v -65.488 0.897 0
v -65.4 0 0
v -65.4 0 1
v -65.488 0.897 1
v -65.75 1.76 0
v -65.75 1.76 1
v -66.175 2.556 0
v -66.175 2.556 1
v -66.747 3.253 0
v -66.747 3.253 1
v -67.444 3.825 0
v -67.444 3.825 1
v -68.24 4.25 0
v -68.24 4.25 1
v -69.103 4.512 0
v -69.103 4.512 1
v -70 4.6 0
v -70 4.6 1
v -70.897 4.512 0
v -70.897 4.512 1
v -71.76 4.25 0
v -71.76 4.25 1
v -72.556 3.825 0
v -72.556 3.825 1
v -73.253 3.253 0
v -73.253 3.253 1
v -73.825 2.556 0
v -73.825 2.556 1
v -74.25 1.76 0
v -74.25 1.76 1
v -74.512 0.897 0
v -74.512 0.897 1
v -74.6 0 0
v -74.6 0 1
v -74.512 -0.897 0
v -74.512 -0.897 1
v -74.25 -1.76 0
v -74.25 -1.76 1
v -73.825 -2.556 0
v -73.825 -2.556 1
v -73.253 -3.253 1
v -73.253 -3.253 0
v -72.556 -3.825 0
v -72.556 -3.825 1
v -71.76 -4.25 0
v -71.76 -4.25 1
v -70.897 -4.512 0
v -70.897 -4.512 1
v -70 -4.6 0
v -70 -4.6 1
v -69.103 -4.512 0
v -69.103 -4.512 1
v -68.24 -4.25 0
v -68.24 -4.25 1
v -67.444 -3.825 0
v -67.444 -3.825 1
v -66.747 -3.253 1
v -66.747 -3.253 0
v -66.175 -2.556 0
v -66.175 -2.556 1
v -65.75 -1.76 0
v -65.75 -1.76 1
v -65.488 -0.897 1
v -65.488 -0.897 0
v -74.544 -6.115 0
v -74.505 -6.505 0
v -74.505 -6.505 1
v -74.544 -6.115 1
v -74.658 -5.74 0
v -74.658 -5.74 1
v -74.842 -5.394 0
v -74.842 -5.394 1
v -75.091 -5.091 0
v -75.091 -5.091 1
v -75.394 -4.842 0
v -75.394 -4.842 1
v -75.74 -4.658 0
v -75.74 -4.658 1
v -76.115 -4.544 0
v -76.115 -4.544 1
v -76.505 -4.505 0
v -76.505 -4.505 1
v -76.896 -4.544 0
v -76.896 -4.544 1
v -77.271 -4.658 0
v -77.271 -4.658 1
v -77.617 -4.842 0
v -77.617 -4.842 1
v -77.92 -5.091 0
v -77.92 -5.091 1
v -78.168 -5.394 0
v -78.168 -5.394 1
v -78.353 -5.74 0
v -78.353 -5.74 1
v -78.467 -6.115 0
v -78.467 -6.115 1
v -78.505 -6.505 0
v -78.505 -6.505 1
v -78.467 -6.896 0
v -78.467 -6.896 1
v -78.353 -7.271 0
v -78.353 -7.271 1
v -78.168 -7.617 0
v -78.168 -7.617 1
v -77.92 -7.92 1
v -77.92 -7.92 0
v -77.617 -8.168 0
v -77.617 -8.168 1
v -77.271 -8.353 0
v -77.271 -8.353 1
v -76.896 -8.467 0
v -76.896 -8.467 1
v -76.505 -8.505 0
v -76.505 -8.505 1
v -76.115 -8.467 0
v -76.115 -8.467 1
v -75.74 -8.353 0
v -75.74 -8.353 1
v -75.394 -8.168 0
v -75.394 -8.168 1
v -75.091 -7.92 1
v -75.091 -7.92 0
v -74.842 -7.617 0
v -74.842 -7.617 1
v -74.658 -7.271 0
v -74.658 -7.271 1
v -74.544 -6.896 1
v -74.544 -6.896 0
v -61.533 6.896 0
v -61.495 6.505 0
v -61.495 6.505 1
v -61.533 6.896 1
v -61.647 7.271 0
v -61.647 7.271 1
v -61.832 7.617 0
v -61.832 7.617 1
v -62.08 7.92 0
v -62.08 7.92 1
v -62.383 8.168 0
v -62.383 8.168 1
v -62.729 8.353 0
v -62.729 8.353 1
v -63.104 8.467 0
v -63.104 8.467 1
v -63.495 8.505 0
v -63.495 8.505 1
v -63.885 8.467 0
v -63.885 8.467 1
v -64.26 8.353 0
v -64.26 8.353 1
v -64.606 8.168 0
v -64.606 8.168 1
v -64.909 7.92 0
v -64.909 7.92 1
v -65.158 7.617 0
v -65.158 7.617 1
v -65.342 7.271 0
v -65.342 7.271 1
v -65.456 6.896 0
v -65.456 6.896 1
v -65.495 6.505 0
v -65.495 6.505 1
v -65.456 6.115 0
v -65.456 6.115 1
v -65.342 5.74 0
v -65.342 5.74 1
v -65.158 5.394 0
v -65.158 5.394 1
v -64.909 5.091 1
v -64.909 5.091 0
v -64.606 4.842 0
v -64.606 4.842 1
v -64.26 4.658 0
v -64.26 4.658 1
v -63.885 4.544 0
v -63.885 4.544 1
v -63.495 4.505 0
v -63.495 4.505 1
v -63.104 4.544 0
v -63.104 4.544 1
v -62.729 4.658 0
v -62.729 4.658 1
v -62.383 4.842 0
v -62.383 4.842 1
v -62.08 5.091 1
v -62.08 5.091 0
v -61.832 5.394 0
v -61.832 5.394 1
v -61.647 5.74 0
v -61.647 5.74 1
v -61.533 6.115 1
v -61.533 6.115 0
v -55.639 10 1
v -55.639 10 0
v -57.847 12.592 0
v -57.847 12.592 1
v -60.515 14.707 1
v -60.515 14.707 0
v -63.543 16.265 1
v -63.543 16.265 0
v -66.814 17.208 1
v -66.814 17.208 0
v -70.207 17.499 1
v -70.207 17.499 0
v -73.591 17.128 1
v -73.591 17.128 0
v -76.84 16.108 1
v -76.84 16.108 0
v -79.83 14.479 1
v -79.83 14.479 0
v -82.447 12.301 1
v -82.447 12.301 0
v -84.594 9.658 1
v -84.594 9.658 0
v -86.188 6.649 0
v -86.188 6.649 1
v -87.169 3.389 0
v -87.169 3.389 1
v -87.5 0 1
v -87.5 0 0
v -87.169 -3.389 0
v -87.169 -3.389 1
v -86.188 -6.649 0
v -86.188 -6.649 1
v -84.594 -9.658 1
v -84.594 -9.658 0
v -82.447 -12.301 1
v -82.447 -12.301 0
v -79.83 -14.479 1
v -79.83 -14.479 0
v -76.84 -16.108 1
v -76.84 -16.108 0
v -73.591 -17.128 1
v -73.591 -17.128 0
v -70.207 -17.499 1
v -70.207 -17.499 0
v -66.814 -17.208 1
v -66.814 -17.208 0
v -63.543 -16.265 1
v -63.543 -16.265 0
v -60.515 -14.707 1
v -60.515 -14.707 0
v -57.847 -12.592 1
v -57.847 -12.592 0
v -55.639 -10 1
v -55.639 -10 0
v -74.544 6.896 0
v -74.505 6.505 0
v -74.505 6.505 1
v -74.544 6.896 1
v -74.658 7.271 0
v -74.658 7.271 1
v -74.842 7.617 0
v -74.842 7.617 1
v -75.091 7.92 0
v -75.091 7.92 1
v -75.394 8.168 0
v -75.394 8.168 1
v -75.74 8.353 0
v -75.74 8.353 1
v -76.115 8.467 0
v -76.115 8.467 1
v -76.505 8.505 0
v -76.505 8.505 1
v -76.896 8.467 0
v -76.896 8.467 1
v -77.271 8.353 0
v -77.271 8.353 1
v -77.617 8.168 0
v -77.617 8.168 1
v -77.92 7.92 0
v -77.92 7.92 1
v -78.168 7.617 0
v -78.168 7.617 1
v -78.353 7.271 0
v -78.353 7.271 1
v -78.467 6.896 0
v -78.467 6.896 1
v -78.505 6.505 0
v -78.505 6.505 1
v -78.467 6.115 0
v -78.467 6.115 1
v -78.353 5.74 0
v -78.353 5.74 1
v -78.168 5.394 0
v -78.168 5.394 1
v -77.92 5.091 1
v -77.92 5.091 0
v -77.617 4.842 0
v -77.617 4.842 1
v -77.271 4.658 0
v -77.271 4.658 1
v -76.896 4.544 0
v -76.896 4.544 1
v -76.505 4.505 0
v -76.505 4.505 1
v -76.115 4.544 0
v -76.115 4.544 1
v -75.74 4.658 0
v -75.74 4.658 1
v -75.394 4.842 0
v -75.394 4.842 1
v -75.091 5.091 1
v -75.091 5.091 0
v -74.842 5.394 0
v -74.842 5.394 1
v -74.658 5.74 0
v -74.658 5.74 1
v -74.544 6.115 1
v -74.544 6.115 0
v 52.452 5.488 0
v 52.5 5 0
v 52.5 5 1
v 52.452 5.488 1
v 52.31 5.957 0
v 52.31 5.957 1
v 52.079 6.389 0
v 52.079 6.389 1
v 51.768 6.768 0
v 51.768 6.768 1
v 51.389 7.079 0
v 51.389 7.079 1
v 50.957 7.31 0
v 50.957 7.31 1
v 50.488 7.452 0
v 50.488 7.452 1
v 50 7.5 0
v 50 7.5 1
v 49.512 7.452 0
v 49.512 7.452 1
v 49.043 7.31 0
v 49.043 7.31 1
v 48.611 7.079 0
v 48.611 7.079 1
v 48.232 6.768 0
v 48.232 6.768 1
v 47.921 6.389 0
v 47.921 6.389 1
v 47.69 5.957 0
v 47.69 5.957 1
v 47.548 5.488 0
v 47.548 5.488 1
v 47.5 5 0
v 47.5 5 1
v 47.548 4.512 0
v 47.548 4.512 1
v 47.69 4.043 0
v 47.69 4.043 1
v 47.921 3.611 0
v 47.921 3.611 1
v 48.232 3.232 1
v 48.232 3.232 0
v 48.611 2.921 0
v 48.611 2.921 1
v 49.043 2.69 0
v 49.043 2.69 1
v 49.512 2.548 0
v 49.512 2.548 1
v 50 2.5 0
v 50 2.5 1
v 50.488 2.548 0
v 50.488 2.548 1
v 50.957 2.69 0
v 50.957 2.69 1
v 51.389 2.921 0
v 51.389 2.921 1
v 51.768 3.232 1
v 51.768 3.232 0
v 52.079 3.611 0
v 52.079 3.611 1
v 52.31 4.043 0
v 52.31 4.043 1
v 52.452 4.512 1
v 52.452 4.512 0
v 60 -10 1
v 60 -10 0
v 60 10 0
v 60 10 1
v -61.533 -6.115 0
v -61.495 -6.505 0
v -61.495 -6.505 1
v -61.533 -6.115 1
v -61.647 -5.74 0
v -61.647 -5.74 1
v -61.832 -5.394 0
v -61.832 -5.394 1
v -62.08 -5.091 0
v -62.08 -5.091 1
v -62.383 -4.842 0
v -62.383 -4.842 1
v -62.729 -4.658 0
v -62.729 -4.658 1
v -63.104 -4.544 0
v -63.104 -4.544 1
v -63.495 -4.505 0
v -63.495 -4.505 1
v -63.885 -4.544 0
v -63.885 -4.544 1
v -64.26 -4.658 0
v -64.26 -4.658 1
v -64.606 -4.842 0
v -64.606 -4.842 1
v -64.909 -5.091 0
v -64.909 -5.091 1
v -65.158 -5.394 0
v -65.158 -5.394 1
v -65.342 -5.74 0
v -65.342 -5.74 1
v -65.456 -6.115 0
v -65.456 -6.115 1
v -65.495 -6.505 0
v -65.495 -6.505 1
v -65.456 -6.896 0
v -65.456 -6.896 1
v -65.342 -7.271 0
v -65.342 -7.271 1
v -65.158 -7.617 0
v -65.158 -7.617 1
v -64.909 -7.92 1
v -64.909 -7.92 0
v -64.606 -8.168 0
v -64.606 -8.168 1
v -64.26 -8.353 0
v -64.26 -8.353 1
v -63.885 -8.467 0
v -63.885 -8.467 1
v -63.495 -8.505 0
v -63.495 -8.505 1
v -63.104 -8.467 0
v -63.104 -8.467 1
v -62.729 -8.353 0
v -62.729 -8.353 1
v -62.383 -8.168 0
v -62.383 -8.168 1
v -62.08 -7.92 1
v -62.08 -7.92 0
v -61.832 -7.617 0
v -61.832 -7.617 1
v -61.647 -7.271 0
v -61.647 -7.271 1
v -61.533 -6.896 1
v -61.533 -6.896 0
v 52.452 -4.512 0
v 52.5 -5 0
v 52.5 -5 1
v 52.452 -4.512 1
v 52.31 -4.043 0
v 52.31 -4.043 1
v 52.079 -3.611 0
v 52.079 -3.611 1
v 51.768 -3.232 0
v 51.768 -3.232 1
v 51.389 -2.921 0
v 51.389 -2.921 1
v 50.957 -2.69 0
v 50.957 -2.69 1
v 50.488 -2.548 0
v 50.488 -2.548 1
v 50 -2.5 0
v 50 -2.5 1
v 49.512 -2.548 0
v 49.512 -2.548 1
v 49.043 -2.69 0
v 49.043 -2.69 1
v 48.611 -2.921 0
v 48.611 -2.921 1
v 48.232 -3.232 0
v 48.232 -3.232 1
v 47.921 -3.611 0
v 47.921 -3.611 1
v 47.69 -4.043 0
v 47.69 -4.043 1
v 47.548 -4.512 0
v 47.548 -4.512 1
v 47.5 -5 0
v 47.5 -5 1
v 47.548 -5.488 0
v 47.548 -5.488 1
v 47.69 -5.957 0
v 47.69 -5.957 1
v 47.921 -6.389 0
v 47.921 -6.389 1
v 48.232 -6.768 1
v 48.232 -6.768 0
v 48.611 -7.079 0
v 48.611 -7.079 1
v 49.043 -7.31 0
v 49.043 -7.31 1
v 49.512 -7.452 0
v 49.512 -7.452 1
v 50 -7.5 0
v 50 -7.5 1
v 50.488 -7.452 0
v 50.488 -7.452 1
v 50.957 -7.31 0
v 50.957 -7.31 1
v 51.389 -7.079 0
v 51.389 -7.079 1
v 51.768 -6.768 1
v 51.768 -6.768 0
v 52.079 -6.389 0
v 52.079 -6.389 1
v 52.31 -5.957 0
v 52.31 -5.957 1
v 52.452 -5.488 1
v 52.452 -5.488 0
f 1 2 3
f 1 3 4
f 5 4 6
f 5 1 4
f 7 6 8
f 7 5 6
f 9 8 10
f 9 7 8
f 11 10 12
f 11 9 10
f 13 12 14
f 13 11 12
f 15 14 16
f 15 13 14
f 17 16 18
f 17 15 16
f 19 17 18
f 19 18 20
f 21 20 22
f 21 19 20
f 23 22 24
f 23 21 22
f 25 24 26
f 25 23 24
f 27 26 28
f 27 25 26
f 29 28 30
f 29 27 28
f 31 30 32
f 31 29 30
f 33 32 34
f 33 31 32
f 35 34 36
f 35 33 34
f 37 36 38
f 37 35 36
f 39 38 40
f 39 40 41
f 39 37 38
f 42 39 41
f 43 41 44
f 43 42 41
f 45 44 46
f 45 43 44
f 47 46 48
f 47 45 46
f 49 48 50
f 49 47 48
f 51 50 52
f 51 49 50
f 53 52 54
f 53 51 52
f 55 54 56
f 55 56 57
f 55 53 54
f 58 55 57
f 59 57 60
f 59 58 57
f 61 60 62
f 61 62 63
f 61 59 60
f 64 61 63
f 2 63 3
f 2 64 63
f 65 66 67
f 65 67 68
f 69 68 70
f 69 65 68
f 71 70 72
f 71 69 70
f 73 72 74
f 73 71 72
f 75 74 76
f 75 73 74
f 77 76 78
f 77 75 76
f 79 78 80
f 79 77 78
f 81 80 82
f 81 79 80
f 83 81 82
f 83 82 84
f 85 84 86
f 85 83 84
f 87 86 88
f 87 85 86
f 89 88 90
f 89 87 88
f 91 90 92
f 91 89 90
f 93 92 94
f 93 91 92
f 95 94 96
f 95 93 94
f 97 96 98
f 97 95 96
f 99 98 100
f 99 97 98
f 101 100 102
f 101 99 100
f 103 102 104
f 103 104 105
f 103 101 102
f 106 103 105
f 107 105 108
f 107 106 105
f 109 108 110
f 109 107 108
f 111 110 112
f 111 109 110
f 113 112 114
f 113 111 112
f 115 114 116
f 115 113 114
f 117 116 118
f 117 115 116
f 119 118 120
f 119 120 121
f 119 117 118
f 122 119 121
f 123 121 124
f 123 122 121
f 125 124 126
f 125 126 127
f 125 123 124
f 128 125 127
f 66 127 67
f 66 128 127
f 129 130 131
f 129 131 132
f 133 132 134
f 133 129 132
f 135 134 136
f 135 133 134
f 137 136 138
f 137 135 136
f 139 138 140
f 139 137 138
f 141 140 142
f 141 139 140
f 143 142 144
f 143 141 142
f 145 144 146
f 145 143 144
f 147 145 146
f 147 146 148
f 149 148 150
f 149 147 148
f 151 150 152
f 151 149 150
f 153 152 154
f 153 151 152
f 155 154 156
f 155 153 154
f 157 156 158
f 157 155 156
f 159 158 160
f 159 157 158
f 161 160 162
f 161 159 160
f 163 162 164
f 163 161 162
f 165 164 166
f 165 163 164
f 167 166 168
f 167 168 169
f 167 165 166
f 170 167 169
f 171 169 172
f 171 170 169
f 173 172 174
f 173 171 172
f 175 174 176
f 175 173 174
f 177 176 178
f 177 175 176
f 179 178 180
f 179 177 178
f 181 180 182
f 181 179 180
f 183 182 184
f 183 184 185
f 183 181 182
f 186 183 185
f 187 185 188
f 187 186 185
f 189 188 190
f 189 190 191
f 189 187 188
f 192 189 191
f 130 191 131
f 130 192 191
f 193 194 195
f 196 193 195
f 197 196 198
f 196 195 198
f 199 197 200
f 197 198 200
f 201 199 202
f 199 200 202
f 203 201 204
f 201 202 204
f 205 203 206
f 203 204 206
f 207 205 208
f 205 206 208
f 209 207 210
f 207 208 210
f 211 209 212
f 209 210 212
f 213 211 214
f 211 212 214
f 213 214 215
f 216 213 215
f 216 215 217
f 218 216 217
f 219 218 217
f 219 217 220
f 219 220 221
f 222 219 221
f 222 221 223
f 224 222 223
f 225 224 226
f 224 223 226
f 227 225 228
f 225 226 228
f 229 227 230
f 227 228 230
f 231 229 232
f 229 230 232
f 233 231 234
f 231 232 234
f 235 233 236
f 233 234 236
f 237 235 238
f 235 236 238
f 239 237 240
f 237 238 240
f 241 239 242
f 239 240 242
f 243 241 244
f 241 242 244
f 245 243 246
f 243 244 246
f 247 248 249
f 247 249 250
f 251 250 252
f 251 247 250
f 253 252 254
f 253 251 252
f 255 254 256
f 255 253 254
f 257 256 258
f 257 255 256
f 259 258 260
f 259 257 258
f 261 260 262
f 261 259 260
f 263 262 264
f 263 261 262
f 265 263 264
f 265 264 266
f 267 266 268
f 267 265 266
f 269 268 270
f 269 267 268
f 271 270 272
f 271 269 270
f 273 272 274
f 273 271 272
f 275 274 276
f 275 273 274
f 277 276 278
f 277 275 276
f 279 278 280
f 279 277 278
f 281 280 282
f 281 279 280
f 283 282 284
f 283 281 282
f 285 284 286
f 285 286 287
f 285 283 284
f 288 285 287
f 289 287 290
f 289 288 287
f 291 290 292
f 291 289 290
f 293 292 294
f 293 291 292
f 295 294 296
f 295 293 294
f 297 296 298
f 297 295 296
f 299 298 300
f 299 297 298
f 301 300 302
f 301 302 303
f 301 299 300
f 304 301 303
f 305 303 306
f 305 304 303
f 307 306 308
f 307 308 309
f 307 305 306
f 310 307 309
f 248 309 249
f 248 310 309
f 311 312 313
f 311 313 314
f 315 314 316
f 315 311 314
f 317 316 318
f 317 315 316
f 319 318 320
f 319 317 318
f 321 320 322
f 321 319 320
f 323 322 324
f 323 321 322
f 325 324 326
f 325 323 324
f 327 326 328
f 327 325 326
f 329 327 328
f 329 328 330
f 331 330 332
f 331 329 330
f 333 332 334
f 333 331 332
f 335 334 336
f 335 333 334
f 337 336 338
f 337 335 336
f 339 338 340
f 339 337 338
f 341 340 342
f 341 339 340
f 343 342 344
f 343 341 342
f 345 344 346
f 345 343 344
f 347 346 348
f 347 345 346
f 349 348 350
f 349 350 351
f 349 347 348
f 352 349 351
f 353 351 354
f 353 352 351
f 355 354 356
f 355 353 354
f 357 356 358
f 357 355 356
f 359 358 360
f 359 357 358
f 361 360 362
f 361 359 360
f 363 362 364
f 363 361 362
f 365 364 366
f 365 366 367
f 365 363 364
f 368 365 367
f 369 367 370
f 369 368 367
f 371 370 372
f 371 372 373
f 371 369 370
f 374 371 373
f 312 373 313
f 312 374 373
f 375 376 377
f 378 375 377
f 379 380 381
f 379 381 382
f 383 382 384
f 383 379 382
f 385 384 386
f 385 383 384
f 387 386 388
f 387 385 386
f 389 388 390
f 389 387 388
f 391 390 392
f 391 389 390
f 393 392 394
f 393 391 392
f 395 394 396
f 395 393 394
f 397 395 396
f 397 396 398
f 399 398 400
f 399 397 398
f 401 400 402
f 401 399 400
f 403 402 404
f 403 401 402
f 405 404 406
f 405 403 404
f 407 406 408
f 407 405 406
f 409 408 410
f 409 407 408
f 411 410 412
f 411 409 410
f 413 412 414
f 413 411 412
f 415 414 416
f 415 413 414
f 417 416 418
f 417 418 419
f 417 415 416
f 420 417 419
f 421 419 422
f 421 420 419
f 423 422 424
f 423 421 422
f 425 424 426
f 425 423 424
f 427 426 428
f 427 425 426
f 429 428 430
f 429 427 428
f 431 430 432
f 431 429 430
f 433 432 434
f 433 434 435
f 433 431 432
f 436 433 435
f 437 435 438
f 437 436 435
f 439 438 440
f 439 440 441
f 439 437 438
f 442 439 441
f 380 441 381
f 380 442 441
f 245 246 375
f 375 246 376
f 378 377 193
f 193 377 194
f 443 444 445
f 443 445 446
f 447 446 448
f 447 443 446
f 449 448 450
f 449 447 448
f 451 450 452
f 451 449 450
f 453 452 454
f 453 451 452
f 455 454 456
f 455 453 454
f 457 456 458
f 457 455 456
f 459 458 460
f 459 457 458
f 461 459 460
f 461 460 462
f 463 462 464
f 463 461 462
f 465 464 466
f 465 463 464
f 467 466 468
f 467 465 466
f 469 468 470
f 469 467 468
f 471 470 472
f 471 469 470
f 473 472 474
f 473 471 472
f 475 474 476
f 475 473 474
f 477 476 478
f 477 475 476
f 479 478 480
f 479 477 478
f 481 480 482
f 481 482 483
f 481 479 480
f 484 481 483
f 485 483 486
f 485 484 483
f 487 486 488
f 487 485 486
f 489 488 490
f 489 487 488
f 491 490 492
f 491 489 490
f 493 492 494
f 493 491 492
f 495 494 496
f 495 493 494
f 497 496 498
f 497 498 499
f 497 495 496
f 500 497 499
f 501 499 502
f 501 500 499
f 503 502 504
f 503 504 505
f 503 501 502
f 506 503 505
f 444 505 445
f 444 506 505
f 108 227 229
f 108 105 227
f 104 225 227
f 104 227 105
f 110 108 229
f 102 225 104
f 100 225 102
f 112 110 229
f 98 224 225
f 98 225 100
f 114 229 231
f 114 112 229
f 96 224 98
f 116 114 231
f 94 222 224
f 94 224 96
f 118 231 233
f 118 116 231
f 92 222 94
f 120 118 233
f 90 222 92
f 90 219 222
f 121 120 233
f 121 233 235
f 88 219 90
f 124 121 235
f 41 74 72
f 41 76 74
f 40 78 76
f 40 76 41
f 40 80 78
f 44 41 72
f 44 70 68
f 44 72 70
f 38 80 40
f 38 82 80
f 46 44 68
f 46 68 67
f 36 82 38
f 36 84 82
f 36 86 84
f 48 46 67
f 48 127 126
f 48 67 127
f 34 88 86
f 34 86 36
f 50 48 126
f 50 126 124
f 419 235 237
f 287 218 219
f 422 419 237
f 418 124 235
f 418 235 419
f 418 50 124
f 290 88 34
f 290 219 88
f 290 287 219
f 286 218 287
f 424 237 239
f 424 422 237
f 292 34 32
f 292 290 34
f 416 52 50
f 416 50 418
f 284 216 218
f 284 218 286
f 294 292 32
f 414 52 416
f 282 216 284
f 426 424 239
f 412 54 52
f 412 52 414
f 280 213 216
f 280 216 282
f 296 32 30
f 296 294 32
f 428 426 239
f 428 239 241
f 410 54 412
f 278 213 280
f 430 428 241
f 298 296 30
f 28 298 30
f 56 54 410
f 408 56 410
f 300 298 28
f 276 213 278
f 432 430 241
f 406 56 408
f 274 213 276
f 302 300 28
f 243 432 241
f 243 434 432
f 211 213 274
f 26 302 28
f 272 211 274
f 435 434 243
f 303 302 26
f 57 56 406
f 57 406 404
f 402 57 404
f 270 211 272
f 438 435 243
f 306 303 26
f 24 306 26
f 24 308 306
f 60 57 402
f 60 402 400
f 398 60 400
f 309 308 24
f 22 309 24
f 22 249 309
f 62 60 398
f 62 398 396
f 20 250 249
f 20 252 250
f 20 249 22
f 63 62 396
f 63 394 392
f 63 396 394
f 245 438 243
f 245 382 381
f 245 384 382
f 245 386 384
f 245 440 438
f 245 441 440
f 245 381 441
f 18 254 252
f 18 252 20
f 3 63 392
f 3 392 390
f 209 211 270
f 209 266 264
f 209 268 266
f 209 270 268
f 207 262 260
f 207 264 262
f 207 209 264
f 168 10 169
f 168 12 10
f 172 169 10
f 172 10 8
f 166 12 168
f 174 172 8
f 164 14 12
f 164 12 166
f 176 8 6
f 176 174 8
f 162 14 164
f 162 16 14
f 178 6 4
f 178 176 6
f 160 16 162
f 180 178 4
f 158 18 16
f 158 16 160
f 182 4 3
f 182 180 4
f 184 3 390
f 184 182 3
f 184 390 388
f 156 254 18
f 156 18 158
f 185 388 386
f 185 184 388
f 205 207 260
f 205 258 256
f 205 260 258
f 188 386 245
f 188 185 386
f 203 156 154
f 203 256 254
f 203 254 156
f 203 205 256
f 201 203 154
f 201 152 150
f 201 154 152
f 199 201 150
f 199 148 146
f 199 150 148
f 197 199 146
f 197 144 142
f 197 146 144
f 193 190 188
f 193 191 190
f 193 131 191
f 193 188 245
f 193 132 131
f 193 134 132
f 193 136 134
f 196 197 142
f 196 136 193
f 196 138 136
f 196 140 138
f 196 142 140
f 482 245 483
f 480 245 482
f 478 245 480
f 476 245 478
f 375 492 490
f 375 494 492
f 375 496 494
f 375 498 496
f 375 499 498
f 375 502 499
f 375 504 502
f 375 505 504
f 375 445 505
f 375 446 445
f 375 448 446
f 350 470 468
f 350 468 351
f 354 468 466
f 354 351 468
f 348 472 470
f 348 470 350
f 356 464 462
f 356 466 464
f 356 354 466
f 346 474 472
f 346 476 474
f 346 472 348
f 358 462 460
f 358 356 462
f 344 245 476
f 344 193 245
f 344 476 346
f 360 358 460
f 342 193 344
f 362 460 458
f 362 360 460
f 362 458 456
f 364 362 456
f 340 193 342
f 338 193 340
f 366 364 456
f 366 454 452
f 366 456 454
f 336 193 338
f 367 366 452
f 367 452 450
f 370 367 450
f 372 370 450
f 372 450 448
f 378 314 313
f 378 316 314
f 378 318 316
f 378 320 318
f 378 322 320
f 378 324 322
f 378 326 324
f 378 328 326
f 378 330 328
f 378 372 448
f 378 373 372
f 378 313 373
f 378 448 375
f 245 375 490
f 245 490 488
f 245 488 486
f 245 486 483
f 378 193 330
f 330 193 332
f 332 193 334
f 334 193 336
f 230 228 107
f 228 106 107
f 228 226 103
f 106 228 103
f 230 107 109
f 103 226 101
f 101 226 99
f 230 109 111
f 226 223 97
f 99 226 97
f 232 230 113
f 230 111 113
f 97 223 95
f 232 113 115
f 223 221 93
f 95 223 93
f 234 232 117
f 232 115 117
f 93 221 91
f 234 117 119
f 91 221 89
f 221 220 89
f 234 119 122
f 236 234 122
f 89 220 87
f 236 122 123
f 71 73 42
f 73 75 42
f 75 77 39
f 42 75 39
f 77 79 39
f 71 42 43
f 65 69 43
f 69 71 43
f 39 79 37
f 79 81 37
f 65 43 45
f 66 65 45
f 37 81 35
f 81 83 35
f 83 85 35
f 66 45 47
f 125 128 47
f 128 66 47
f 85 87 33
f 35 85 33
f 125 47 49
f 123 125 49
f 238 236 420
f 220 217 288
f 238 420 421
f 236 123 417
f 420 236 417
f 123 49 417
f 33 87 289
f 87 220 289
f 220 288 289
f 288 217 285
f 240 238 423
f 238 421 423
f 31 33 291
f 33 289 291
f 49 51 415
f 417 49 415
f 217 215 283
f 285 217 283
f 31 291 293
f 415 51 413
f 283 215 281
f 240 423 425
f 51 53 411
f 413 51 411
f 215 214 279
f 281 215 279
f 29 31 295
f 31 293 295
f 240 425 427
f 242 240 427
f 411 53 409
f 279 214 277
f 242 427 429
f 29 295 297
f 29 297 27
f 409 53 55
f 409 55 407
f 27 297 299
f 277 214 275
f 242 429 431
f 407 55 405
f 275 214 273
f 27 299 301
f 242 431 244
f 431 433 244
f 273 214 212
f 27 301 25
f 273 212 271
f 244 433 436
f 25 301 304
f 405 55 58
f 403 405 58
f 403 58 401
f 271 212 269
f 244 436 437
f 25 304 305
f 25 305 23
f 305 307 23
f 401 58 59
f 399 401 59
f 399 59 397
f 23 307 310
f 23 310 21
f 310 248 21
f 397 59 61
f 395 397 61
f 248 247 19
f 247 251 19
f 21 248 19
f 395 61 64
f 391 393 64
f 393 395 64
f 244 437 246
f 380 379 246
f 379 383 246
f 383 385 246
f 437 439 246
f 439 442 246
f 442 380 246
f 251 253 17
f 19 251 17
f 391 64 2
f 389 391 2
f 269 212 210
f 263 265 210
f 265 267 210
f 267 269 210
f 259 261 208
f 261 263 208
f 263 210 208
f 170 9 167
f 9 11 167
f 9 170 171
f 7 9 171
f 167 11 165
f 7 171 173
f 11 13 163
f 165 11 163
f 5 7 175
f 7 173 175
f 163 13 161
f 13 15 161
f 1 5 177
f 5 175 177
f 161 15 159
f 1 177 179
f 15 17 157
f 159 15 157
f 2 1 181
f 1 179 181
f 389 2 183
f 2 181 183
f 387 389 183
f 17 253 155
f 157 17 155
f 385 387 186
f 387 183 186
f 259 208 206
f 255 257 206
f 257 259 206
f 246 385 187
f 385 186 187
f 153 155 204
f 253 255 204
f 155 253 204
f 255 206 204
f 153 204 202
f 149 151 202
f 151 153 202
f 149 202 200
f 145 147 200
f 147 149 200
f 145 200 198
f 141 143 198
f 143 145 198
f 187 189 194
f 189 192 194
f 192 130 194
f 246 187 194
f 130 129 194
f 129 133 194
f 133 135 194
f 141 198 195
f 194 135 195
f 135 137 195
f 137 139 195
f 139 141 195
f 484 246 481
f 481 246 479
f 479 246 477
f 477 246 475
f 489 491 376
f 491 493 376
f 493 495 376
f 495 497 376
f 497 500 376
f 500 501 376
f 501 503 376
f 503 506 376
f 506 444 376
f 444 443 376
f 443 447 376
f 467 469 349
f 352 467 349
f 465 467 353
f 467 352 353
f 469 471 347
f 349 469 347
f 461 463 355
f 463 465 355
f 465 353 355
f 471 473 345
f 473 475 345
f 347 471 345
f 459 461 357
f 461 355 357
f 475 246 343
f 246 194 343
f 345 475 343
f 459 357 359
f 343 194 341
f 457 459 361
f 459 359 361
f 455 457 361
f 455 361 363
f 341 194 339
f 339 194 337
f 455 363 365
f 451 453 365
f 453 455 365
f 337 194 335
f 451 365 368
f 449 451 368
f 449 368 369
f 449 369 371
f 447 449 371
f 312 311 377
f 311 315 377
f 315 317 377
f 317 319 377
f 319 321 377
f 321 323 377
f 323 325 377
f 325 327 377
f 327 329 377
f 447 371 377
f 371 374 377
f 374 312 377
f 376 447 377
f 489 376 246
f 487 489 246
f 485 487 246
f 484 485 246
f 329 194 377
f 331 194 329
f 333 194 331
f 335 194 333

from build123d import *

# Parameters (mm, degrees)
F0_R     = 2
F0_R_2   = 4.6
F0_R_3   = 2.5
F1_DEPTH = 1


with BuildPart() as f1:
    # F0 (on Top) → F1 (new body)
    with BuildSketch(Plane.XY):
        with BuildLine():
            Line((-55.638593, -10), (60, -10))
            Line((60, -10), (60, 10))
            Line((60, 10), (-55.638593, 10))
            ThreePointArc((-55.638593, 10), (-87.5, 0), (-55.638593, -10))
        make_face()
        with Locations((-76.505382, -6.505382)):
            Circle(F0_R, mode=Mode.SUBTRACT)
        with Locations((-63.494618, -6.505382)):
            Circle(F0_R, mode=Mode.SUBTRACT)
        with Locations((-70, 0)):
            Circle(F0_R_2, mode=Mode.SUBTRACT)
        with Locations((50, -5)):
            Circle(F0_R_3, mode=Mode.SUBTRACT)
        with Locations((-76.505382, 6.505382)):
            Circle(F0_R, mode=Mode.SUBTRACT)
        with Locations((-63.494618, 6.505382)):
            Circle(F0_R, mode=Mode.SUBTRACT)
        with Locations((50, 5)):
            Circle(F0_R_3, mode=Mode.SUBTRACT)
    extrude(amount=F1_DEPTH)


solid = f1.part
